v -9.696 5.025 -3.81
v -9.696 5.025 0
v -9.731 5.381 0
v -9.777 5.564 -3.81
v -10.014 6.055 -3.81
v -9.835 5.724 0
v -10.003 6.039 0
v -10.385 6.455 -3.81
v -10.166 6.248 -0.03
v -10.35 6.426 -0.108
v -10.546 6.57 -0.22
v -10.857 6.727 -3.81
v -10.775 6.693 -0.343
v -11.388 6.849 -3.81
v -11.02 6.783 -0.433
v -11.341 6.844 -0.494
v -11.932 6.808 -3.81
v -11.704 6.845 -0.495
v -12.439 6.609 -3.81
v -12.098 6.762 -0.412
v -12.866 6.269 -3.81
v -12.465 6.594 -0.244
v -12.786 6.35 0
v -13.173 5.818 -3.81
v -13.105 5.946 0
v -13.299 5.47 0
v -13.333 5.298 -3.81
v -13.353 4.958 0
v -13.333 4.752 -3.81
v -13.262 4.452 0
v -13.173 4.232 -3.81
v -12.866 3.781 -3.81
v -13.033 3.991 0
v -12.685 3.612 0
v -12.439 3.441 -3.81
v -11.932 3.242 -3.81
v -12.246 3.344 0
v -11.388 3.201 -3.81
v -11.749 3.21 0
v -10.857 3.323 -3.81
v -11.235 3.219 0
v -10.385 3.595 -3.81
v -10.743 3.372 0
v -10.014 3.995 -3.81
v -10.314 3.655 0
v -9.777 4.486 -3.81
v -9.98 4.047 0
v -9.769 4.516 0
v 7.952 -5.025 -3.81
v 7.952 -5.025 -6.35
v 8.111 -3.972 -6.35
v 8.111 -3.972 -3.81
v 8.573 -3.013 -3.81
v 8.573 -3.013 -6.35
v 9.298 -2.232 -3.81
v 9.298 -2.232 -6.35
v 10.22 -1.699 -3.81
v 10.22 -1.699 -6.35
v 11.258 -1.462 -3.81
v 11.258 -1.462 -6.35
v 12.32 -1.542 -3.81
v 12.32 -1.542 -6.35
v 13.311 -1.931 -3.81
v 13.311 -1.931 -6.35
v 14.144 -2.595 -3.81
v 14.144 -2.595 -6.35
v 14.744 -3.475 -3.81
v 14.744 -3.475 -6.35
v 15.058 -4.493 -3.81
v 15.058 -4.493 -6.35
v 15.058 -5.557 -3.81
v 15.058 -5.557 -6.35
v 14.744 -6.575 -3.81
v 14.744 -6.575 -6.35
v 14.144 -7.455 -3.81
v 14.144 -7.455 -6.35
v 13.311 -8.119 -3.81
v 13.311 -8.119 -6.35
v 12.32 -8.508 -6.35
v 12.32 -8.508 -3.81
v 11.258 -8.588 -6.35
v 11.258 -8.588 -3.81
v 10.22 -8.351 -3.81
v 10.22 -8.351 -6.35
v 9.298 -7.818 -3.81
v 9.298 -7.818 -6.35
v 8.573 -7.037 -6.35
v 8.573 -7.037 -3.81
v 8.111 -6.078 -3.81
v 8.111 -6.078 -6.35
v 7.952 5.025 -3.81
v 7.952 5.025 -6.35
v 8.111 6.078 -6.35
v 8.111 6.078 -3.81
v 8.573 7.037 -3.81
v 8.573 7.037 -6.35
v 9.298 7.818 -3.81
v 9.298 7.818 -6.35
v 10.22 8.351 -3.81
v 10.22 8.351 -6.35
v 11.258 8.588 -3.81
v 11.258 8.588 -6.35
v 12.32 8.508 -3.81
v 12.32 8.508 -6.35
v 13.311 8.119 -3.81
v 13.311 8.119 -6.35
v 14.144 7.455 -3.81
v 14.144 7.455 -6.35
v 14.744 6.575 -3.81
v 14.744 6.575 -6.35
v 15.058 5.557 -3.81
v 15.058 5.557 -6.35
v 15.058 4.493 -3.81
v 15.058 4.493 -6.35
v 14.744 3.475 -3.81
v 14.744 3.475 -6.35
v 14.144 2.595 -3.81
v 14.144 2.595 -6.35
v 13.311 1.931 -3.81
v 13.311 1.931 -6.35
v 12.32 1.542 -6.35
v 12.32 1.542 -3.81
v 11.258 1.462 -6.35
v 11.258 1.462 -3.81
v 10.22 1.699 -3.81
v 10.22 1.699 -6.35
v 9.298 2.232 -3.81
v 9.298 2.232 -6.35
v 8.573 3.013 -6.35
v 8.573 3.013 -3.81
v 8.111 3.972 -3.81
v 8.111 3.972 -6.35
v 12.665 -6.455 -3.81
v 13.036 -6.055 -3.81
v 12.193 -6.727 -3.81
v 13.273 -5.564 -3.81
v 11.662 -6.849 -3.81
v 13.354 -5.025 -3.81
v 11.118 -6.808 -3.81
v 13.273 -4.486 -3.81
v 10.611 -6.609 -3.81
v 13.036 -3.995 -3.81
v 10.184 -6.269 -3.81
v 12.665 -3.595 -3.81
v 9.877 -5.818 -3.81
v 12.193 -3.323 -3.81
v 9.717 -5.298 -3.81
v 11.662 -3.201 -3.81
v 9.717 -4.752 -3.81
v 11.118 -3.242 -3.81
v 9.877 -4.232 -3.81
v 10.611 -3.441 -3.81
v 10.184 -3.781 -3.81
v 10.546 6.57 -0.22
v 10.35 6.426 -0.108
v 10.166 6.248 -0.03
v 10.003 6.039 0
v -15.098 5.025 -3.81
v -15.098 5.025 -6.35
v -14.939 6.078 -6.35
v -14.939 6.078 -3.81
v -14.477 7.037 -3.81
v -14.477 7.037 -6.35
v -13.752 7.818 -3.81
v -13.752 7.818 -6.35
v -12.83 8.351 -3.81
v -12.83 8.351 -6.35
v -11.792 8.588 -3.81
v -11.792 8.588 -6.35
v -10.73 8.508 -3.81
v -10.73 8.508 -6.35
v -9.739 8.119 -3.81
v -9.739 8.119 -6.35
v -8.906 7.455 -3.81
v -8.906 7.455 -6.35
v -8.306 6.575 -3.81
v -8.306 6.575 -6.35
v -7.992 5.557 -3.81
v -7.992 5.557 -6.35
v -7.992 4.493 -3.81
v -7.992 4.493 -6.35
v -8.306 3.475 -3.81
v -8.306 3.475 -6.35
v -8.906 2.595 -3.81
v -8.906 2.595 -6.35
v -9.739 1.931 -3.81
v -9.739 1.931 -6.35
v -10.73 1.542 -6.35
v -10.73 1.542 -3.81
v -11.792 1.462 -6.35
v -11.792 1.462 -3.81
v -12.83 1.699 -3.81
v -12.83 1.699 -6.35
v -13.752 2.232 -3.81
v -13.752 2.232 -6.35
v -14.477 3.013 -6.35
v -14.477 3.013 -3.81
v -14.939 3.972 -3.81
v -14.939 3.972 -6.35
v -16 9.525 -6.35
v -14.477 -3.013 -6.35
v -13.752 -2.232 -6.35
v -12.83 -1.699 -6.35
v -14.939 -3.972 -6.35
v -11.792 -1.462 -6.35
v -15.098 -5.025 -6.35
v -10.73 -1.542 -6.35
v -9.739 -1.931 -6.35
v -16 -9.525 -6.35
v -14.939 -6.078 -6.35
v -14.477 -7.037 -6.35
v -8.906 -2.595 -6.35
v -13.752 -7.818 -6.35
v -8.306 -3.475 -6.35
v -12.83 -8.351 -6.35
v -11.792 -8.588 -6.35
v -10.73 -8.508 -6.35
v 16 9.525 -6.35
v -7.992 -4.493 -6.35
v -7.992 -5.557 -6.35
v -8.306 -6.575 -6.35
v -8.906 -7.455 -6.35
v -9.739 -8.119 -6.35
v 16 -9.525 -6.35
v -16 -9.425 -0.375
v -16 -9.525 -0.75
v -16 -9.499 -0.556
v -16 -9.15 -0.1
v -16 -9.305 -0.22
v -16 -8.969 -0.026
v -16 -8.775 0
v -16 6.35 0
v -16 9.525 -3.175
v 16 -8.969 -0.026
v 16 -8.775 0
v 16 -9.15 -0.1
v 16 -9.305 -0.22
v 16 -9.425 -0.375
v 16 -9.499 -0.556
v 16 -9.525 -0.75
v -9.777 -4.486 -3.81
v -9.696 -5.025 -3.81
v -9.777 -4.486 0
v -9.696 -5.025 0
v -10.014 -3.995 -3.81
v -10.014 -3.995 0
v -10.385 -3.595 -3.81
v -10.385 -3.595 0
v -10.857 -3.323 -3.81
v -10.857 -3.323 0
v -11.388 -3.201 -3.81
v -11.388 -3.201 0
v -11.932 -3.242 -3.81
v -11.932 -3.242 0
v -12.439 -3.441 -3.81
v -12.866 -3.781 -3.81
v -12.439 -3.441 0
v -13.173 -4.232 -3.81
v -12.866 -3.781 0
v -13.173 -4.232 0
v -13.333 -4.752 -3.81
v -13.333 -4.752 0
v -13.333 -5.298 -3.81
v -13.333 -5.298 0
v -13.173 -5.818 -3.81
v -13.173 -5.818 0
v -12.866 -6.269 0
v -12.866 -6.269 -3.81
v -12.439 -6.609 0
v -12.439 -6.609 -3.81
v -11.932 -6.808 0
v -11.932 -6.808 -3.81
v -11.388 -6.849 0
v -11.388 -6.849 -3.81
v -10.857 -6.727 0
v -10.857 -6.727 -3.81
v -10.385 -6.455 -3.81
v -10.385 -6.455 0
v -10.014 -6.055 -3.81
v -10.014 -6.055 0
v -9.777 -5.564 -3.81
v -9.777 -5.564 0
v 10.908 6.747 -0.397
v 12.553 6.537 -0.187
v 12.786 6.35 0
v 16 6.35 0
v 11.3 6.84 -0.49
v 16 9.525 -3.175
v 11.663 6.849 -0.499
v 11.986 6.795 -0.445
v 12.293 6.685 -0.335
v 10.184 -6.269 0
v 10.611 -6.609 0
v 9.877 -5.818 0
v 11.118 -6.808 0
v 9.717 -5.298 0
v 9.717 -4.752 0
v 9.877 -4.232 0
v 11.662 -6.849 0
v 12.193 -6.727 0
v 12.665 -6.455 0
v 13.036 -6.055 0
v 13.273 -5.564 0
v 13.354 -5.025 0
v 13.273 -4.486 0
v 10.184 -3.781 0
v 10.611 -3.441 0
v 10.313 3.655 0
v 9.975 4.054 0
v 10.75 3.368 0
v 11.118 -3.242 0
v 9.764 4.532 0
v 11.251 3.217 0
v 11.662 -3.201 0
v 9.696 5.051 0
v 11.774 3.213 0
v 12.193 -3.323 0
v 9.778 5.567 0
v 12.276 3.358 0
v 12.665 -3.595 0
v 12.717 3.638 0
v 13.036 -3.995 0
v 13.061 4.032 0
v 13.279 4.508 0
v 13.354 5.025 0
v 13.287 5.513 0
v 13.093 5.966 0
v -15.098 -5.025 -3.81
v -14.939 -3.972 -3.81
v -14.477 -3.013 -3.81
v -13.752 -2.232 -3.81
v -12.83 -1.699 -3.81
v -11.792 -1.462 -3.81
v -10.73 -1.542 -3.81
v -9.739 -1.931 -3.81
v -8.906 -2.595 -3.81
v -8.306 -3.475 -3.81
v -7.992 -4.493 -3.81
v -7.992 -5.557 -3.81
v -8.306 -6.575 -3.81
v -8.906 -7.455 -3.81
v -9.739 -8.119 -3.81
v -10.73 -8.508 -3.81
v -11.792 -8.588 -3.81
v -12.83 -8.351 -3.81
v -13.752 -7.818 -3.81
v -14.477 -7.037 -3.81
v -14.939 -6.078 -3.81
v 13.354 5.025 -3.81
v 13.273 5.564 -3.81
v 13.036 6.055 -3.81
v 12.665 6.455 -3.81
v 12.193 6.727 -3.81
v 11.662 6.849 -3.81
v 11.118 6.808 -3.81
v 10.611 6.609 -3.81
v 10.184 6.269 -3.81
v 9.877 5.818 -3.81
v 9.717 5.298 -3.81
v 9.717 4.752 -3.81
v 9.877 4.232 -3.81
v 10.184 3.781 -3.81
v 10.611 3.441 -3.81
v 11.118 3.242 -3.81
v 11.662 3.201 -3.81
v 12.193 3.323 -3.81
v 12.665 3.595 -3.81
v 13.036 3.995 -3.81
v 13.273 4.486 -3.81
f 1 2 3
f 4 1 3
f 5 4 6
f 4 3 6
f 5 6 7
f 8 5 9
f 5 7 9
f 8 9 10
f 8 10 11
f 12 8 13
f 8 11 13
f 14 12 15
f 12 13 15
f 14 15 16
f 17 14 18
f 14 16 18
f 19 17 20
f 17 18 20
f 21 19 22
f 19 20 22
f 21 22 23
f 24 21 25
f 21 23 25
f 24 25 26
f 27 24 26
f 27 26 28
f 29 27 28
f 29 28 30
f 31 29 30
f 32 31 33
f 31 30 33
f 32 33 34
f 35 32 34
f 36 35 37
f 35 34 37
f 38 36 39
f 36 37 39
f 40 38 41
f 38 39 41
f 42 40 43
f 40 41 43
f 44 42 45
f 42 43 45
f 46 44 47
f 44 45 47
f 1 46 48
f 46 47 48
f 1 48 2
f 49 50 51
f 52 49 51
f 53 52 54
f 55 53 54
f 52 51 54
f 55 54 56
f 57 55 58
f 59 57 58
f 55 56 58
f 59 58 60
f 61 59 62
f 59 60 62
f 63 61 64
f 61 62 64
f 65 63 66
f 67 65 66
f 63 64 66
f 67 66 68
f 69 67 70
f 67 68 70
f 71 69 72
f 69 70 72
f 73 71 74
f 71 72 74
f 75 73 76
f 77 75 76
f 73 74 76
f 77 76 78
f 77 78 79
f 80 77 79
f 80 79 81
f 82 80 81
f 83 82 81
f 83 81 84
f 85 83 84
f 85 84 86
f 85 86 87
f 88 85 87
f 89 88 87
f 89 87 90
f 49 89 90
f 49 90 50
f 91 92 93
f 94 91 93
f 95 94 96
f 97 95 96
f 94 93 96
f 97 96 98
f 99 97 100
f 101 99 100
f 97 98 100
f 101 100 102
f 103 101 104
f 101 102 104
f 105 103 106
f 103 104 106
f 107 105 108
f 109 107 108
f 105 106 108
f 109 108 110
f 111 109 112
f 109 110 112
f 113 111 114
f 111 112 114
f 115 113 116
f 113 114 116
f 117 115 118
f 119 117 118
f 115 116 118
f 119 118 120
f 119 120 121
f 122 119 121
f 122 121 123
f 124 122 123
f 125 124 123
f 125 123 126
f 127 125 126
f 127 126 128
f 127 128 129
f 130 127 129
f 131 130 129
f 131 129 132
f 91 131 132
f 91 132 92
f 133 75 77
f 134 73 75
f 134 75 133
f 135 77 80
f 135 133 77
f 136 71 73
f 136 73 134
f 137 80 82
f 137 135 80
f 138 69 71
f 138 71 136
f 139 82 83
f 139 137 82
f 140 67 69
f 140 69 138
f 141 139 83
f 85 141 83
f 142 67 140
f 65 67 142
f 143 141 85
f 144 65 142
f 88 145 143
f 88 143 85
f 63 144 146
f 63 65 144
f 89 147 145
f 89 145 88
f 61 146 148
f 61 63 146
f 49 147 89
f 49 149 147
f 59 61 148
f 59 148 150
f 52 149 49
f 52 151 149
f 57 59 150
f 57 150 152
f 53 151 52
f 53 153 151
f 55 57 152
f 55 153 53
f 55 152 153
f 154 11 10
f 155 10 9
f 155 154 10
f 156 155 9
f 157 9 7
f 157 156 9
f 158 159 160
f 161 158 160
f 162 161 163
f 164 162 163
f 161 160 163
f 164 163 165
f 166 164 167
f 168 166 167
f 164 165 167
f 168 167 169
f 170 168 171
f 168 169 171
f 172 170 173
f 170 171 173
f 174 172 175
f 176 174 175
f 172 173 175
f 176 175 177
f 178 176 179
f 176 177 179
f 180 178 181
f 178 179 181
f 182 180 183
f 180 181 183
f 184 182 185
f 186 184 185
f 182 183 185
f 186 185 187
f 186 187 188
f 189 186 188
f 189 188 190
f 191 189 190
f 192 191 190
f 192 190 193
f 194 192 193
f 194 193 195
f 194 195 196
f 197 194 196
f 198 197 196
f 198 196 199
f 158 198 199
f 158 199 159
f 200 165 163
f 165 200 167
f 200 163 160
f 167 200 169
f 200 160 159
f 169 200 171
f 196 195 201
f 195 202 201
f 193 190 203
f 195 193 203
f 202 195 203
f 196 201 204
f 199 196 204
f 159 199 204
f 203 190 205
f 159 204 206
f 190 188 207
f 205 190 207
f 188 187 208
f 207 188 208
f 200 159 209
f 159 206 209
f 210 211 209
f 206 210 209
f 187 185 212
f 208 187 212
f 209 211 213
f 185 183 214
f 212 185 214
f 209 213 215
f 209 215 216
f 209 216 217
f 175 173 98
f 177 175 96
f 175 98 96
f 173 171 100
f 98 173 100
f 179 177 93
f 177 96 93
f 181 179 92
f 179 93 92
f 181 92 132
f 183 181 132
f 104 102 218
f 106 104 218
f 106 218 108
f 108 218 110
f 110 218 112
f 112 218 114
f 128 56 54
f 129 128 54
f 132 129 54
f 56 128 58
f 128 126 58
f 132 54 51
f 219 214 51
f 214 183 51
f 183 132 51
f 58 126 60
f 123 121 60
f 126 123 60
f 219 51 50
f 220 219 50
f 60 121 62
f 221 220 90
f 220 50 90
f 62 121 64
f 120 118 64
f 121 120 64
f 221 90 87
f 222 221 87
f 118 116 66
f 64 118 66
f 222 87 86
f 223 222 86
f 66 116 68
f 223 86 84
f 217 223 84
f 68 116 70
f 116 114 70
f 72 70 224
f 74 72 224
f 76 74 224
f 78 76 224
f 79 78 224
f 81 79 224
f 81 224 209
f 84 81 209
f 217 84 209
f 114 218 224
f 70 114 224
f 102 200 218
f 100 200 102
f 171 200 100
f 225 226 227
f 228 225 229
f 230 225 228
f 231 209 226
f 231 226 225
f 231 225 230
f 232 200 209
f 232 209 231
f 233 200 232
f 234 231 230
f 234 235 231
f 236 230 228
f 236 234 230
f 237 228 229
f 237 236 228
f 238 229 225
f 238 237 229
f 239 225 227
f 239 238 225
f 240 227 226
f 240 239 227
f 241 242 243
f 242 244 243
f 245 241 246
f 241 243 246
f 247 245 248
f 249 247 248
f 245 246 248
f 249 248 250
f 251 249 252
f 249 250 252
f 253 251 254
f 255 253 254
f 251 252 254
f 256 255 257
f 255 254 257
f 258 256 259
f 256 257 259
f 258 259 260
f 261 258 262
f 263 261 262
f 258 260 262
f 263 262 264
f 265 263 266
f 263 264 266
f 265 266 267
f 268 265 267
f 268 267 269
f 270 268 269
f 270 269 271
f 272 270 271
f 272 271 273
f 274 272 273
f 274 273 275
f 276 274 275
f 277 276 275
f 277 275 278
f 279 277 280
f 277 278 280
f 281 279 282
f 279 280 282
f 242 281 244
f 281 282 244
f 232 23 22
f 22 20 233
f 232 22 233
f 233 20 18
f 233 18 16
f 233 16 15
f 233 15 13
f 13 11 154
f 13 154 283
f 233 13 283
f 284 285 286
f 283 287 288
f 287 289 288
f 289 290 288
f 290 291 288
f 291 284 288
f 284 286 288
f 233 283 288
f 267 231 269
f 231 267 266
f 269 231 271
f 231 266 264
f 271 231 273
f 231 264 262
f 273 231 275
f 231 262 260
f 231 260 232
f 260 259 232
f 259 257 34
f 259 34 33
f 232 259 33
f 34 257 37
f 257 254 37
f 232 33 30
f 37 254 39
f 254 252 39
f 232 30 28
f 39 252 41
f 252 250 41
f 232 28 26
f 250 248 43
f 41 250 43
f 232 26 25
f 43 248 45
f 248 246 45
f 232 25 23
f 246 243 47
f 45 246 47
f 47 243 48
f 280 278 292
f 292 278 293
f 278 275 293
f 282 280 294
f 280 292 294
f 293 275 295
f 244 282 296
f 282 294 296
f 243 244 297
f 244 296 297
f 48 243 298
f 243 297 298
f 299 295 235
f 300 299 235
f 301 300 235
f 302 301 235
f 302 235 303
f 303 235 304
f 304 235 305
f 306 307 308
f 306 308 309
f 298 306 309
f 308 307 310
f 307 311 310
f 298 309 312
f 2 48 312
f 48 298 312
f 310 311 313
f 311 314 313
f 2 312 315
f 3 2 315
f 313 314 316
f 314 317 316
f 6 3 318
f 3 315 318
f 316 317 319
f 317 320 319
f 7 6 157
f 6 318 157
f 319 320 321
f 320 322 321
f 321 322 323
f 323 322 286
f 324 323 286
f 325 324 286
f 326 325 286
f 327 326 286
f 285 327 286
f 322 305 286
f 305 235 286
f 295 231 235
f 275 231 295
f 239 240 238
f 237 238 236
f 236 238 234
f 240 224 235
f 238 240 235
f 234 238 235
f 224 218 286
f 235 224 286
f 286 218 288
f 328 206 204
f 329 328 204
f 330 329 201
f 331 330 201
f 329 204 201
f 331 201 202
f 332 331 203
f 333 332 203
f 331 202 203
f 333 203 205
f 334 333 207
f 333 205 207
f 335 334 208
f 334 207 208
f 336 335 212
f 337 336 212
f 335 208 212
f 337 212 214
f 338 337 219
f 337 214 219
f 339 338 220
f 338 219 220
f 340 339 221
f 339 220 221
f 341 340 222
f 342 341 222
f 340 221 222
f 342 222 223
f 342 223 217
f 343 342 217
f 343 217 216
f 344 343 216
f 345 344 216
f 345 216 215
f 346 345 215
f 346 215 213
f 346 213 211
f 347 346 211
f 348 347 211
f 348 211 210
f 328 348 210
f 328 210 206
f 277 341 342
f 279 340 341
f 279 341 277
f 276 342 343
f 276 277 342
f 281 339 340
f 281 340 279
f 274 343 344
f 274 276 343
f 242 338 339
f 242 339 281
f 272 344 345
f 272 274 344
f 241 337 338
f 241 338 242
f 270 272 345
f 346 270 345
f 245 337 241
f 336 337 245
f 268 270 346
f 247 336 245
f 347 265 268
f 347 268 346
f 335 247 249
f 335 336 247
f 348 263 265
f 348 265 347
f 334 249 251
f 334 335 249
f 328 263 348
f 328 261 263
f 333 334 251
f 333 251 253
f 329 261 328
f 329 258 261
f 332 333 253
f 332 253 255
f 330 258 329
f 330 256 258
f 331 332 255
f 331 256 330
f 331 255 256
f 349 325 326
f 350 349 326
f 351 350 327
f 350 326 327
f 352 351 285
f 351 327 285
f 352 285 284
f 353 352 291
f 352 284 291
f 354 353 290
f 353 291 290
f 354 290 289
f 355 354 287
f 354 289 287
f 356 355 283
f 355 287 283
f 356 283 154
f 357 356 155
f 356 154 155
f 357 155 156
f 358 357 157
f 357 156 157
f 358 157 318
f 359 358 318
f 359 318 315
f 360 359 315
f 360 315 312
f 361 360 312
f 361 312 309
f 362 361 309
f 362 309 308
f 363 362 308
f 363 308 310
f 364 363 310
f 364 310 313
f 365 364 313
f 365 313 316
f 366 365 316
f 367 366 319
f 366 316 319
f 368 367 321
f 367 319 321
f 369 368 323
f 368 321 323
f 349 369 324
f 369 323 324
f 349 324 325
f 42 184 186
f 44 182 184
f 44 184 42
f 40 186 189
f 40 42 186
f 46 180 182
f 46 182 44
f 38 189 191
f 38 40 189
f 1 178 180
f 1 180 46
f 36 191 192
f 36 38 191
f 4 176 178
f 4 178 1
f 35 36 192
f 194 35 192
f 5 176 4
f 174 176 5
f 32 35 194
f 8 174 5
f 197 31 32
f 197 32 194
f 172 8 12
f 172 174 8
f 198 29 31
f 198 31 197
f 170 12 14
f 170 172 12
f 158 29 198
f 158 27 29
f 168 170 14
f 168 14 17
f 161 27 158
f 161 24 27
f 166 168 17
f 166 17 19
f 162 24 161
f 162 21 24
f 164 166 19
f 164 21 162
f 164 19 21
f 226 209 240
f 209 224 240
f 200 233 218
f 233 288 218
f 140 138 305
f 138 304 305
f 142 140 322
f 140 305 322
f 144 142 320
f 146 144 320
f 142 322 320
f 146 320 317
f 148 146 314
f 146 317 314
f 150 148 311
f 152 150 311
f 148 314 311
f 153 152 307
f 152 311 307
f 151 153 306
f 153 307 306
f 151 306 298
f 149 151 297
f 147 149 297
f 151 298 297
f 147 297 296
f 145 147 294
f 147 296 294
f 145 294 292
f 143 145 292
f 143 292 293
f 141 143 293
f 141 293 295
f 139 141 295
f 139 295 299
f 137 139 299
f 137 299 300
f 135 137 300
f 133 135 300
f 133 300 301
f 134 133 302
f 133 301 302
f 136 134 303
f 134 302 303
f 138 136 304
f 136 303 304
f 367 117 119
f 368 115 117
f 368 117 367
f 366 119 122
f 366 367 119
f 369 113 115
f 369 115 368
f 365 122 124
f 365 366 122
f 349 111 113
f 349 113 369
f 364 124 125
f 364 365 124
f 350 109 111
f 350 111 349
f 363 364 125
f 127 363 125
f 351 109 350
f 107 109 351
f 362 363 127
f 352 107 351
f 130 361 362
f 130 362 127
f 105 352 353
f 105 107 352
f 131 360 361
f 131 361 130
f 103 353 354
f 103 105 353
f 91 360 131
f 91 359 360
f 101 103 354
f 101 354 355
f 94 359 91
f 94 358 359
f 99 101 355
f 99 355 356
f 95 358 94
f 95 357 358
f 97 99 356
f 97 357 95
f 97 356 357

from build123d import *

# Parameters (mm, degrees)
BOSS_EXTRUDE1_DEPTH                            = 16
CBORE_FOR_6_SOCKET_HEAD_CAP_SCREW1_D           = 3.6576
CBORE_FOR_6_SOCKET_HEAD_CAP_SCREW1_DEPTH       = 9.398
CBORE_FOR_6_SOCKET_HEAD_CAP_SCREW1_CBORE_D     = 7.14502
CBORE_FOR_6_SOCKET_HEAD_CAP_SCREW1_CBORE_DEPTH = 2.54
CBORE_FOR_6_SOCKET_HEAD_CAP_SCREW1_TIP         = 1.0988539
FILLET1_R                                      = 0.75


with BuildPart() as part:
    # Sketch1 → Boss-Extrude1 (new, symmetric)
    with BuildSketch(Plane(origin=(0, 0, 0), x_dir=(0, 0, -1), z_dir=(1, 0, 0))):
        Polygon((0, 6.35), (3.175, 9.525), (6.35, 9.525), (6.35, -9.525), (0, -9.525), align=None)
    extrude(amount=BOSS_EXTRUDE1_DEPTH, both=True)

    # CBORE for #6 Socket Head Cap Screw1
    with Locations(Plane(origin=(0, 0, -6.35), x_dir=(-1, 0, 0), z_dir=(0, 0, -1))):
        with Locations((11.525, -5.025), (-11.525, 5.025), (-11.525, -5.025), (11.525, 5.025)):
            CounterBoreHole(CBORE_FOR_6_SOCKET_HEAD_CAP_SCREW1_D / 2, CBORE_FOR_6_SOCKET_HEAD_CAP_SCREW1_CBORE_D / 2, CBORE_FOR_6_SOCKET_HEAD_CAP_SCREW1_CBORE_DEPTH, depth=CBORE_FOR_6_SOCKET_HEAD_CAP_SCREW1_DEPTH)
            with Locations((0, 0, -(CBORE_FOR_6_SOCKET_HEAD_CAP_SCREW1_DEPTH + CBORE_FOR_6_SOCKET_HEAD_CAP_SCREW1_TIP / 2))):  # 118° drill point
                Cone(0, CBORE_FOR_6_SOCKET_HEAD_CAP_SCREW1_D / 2, CBORE_FOR_6_SOCKET_HEAD_CAP_SCREW1_TIP, mode=Mode.SUBTRACT)

    # Fillet1
    fillet1_edges = [part.edges().sort_by_distance(p)[0] for p in [
        (0, 6.35, 0),
        (0, -9.525, 0),
    ]]
    fillet(fillet1_edges, radius=FILLET1_R)


solid = part.part
